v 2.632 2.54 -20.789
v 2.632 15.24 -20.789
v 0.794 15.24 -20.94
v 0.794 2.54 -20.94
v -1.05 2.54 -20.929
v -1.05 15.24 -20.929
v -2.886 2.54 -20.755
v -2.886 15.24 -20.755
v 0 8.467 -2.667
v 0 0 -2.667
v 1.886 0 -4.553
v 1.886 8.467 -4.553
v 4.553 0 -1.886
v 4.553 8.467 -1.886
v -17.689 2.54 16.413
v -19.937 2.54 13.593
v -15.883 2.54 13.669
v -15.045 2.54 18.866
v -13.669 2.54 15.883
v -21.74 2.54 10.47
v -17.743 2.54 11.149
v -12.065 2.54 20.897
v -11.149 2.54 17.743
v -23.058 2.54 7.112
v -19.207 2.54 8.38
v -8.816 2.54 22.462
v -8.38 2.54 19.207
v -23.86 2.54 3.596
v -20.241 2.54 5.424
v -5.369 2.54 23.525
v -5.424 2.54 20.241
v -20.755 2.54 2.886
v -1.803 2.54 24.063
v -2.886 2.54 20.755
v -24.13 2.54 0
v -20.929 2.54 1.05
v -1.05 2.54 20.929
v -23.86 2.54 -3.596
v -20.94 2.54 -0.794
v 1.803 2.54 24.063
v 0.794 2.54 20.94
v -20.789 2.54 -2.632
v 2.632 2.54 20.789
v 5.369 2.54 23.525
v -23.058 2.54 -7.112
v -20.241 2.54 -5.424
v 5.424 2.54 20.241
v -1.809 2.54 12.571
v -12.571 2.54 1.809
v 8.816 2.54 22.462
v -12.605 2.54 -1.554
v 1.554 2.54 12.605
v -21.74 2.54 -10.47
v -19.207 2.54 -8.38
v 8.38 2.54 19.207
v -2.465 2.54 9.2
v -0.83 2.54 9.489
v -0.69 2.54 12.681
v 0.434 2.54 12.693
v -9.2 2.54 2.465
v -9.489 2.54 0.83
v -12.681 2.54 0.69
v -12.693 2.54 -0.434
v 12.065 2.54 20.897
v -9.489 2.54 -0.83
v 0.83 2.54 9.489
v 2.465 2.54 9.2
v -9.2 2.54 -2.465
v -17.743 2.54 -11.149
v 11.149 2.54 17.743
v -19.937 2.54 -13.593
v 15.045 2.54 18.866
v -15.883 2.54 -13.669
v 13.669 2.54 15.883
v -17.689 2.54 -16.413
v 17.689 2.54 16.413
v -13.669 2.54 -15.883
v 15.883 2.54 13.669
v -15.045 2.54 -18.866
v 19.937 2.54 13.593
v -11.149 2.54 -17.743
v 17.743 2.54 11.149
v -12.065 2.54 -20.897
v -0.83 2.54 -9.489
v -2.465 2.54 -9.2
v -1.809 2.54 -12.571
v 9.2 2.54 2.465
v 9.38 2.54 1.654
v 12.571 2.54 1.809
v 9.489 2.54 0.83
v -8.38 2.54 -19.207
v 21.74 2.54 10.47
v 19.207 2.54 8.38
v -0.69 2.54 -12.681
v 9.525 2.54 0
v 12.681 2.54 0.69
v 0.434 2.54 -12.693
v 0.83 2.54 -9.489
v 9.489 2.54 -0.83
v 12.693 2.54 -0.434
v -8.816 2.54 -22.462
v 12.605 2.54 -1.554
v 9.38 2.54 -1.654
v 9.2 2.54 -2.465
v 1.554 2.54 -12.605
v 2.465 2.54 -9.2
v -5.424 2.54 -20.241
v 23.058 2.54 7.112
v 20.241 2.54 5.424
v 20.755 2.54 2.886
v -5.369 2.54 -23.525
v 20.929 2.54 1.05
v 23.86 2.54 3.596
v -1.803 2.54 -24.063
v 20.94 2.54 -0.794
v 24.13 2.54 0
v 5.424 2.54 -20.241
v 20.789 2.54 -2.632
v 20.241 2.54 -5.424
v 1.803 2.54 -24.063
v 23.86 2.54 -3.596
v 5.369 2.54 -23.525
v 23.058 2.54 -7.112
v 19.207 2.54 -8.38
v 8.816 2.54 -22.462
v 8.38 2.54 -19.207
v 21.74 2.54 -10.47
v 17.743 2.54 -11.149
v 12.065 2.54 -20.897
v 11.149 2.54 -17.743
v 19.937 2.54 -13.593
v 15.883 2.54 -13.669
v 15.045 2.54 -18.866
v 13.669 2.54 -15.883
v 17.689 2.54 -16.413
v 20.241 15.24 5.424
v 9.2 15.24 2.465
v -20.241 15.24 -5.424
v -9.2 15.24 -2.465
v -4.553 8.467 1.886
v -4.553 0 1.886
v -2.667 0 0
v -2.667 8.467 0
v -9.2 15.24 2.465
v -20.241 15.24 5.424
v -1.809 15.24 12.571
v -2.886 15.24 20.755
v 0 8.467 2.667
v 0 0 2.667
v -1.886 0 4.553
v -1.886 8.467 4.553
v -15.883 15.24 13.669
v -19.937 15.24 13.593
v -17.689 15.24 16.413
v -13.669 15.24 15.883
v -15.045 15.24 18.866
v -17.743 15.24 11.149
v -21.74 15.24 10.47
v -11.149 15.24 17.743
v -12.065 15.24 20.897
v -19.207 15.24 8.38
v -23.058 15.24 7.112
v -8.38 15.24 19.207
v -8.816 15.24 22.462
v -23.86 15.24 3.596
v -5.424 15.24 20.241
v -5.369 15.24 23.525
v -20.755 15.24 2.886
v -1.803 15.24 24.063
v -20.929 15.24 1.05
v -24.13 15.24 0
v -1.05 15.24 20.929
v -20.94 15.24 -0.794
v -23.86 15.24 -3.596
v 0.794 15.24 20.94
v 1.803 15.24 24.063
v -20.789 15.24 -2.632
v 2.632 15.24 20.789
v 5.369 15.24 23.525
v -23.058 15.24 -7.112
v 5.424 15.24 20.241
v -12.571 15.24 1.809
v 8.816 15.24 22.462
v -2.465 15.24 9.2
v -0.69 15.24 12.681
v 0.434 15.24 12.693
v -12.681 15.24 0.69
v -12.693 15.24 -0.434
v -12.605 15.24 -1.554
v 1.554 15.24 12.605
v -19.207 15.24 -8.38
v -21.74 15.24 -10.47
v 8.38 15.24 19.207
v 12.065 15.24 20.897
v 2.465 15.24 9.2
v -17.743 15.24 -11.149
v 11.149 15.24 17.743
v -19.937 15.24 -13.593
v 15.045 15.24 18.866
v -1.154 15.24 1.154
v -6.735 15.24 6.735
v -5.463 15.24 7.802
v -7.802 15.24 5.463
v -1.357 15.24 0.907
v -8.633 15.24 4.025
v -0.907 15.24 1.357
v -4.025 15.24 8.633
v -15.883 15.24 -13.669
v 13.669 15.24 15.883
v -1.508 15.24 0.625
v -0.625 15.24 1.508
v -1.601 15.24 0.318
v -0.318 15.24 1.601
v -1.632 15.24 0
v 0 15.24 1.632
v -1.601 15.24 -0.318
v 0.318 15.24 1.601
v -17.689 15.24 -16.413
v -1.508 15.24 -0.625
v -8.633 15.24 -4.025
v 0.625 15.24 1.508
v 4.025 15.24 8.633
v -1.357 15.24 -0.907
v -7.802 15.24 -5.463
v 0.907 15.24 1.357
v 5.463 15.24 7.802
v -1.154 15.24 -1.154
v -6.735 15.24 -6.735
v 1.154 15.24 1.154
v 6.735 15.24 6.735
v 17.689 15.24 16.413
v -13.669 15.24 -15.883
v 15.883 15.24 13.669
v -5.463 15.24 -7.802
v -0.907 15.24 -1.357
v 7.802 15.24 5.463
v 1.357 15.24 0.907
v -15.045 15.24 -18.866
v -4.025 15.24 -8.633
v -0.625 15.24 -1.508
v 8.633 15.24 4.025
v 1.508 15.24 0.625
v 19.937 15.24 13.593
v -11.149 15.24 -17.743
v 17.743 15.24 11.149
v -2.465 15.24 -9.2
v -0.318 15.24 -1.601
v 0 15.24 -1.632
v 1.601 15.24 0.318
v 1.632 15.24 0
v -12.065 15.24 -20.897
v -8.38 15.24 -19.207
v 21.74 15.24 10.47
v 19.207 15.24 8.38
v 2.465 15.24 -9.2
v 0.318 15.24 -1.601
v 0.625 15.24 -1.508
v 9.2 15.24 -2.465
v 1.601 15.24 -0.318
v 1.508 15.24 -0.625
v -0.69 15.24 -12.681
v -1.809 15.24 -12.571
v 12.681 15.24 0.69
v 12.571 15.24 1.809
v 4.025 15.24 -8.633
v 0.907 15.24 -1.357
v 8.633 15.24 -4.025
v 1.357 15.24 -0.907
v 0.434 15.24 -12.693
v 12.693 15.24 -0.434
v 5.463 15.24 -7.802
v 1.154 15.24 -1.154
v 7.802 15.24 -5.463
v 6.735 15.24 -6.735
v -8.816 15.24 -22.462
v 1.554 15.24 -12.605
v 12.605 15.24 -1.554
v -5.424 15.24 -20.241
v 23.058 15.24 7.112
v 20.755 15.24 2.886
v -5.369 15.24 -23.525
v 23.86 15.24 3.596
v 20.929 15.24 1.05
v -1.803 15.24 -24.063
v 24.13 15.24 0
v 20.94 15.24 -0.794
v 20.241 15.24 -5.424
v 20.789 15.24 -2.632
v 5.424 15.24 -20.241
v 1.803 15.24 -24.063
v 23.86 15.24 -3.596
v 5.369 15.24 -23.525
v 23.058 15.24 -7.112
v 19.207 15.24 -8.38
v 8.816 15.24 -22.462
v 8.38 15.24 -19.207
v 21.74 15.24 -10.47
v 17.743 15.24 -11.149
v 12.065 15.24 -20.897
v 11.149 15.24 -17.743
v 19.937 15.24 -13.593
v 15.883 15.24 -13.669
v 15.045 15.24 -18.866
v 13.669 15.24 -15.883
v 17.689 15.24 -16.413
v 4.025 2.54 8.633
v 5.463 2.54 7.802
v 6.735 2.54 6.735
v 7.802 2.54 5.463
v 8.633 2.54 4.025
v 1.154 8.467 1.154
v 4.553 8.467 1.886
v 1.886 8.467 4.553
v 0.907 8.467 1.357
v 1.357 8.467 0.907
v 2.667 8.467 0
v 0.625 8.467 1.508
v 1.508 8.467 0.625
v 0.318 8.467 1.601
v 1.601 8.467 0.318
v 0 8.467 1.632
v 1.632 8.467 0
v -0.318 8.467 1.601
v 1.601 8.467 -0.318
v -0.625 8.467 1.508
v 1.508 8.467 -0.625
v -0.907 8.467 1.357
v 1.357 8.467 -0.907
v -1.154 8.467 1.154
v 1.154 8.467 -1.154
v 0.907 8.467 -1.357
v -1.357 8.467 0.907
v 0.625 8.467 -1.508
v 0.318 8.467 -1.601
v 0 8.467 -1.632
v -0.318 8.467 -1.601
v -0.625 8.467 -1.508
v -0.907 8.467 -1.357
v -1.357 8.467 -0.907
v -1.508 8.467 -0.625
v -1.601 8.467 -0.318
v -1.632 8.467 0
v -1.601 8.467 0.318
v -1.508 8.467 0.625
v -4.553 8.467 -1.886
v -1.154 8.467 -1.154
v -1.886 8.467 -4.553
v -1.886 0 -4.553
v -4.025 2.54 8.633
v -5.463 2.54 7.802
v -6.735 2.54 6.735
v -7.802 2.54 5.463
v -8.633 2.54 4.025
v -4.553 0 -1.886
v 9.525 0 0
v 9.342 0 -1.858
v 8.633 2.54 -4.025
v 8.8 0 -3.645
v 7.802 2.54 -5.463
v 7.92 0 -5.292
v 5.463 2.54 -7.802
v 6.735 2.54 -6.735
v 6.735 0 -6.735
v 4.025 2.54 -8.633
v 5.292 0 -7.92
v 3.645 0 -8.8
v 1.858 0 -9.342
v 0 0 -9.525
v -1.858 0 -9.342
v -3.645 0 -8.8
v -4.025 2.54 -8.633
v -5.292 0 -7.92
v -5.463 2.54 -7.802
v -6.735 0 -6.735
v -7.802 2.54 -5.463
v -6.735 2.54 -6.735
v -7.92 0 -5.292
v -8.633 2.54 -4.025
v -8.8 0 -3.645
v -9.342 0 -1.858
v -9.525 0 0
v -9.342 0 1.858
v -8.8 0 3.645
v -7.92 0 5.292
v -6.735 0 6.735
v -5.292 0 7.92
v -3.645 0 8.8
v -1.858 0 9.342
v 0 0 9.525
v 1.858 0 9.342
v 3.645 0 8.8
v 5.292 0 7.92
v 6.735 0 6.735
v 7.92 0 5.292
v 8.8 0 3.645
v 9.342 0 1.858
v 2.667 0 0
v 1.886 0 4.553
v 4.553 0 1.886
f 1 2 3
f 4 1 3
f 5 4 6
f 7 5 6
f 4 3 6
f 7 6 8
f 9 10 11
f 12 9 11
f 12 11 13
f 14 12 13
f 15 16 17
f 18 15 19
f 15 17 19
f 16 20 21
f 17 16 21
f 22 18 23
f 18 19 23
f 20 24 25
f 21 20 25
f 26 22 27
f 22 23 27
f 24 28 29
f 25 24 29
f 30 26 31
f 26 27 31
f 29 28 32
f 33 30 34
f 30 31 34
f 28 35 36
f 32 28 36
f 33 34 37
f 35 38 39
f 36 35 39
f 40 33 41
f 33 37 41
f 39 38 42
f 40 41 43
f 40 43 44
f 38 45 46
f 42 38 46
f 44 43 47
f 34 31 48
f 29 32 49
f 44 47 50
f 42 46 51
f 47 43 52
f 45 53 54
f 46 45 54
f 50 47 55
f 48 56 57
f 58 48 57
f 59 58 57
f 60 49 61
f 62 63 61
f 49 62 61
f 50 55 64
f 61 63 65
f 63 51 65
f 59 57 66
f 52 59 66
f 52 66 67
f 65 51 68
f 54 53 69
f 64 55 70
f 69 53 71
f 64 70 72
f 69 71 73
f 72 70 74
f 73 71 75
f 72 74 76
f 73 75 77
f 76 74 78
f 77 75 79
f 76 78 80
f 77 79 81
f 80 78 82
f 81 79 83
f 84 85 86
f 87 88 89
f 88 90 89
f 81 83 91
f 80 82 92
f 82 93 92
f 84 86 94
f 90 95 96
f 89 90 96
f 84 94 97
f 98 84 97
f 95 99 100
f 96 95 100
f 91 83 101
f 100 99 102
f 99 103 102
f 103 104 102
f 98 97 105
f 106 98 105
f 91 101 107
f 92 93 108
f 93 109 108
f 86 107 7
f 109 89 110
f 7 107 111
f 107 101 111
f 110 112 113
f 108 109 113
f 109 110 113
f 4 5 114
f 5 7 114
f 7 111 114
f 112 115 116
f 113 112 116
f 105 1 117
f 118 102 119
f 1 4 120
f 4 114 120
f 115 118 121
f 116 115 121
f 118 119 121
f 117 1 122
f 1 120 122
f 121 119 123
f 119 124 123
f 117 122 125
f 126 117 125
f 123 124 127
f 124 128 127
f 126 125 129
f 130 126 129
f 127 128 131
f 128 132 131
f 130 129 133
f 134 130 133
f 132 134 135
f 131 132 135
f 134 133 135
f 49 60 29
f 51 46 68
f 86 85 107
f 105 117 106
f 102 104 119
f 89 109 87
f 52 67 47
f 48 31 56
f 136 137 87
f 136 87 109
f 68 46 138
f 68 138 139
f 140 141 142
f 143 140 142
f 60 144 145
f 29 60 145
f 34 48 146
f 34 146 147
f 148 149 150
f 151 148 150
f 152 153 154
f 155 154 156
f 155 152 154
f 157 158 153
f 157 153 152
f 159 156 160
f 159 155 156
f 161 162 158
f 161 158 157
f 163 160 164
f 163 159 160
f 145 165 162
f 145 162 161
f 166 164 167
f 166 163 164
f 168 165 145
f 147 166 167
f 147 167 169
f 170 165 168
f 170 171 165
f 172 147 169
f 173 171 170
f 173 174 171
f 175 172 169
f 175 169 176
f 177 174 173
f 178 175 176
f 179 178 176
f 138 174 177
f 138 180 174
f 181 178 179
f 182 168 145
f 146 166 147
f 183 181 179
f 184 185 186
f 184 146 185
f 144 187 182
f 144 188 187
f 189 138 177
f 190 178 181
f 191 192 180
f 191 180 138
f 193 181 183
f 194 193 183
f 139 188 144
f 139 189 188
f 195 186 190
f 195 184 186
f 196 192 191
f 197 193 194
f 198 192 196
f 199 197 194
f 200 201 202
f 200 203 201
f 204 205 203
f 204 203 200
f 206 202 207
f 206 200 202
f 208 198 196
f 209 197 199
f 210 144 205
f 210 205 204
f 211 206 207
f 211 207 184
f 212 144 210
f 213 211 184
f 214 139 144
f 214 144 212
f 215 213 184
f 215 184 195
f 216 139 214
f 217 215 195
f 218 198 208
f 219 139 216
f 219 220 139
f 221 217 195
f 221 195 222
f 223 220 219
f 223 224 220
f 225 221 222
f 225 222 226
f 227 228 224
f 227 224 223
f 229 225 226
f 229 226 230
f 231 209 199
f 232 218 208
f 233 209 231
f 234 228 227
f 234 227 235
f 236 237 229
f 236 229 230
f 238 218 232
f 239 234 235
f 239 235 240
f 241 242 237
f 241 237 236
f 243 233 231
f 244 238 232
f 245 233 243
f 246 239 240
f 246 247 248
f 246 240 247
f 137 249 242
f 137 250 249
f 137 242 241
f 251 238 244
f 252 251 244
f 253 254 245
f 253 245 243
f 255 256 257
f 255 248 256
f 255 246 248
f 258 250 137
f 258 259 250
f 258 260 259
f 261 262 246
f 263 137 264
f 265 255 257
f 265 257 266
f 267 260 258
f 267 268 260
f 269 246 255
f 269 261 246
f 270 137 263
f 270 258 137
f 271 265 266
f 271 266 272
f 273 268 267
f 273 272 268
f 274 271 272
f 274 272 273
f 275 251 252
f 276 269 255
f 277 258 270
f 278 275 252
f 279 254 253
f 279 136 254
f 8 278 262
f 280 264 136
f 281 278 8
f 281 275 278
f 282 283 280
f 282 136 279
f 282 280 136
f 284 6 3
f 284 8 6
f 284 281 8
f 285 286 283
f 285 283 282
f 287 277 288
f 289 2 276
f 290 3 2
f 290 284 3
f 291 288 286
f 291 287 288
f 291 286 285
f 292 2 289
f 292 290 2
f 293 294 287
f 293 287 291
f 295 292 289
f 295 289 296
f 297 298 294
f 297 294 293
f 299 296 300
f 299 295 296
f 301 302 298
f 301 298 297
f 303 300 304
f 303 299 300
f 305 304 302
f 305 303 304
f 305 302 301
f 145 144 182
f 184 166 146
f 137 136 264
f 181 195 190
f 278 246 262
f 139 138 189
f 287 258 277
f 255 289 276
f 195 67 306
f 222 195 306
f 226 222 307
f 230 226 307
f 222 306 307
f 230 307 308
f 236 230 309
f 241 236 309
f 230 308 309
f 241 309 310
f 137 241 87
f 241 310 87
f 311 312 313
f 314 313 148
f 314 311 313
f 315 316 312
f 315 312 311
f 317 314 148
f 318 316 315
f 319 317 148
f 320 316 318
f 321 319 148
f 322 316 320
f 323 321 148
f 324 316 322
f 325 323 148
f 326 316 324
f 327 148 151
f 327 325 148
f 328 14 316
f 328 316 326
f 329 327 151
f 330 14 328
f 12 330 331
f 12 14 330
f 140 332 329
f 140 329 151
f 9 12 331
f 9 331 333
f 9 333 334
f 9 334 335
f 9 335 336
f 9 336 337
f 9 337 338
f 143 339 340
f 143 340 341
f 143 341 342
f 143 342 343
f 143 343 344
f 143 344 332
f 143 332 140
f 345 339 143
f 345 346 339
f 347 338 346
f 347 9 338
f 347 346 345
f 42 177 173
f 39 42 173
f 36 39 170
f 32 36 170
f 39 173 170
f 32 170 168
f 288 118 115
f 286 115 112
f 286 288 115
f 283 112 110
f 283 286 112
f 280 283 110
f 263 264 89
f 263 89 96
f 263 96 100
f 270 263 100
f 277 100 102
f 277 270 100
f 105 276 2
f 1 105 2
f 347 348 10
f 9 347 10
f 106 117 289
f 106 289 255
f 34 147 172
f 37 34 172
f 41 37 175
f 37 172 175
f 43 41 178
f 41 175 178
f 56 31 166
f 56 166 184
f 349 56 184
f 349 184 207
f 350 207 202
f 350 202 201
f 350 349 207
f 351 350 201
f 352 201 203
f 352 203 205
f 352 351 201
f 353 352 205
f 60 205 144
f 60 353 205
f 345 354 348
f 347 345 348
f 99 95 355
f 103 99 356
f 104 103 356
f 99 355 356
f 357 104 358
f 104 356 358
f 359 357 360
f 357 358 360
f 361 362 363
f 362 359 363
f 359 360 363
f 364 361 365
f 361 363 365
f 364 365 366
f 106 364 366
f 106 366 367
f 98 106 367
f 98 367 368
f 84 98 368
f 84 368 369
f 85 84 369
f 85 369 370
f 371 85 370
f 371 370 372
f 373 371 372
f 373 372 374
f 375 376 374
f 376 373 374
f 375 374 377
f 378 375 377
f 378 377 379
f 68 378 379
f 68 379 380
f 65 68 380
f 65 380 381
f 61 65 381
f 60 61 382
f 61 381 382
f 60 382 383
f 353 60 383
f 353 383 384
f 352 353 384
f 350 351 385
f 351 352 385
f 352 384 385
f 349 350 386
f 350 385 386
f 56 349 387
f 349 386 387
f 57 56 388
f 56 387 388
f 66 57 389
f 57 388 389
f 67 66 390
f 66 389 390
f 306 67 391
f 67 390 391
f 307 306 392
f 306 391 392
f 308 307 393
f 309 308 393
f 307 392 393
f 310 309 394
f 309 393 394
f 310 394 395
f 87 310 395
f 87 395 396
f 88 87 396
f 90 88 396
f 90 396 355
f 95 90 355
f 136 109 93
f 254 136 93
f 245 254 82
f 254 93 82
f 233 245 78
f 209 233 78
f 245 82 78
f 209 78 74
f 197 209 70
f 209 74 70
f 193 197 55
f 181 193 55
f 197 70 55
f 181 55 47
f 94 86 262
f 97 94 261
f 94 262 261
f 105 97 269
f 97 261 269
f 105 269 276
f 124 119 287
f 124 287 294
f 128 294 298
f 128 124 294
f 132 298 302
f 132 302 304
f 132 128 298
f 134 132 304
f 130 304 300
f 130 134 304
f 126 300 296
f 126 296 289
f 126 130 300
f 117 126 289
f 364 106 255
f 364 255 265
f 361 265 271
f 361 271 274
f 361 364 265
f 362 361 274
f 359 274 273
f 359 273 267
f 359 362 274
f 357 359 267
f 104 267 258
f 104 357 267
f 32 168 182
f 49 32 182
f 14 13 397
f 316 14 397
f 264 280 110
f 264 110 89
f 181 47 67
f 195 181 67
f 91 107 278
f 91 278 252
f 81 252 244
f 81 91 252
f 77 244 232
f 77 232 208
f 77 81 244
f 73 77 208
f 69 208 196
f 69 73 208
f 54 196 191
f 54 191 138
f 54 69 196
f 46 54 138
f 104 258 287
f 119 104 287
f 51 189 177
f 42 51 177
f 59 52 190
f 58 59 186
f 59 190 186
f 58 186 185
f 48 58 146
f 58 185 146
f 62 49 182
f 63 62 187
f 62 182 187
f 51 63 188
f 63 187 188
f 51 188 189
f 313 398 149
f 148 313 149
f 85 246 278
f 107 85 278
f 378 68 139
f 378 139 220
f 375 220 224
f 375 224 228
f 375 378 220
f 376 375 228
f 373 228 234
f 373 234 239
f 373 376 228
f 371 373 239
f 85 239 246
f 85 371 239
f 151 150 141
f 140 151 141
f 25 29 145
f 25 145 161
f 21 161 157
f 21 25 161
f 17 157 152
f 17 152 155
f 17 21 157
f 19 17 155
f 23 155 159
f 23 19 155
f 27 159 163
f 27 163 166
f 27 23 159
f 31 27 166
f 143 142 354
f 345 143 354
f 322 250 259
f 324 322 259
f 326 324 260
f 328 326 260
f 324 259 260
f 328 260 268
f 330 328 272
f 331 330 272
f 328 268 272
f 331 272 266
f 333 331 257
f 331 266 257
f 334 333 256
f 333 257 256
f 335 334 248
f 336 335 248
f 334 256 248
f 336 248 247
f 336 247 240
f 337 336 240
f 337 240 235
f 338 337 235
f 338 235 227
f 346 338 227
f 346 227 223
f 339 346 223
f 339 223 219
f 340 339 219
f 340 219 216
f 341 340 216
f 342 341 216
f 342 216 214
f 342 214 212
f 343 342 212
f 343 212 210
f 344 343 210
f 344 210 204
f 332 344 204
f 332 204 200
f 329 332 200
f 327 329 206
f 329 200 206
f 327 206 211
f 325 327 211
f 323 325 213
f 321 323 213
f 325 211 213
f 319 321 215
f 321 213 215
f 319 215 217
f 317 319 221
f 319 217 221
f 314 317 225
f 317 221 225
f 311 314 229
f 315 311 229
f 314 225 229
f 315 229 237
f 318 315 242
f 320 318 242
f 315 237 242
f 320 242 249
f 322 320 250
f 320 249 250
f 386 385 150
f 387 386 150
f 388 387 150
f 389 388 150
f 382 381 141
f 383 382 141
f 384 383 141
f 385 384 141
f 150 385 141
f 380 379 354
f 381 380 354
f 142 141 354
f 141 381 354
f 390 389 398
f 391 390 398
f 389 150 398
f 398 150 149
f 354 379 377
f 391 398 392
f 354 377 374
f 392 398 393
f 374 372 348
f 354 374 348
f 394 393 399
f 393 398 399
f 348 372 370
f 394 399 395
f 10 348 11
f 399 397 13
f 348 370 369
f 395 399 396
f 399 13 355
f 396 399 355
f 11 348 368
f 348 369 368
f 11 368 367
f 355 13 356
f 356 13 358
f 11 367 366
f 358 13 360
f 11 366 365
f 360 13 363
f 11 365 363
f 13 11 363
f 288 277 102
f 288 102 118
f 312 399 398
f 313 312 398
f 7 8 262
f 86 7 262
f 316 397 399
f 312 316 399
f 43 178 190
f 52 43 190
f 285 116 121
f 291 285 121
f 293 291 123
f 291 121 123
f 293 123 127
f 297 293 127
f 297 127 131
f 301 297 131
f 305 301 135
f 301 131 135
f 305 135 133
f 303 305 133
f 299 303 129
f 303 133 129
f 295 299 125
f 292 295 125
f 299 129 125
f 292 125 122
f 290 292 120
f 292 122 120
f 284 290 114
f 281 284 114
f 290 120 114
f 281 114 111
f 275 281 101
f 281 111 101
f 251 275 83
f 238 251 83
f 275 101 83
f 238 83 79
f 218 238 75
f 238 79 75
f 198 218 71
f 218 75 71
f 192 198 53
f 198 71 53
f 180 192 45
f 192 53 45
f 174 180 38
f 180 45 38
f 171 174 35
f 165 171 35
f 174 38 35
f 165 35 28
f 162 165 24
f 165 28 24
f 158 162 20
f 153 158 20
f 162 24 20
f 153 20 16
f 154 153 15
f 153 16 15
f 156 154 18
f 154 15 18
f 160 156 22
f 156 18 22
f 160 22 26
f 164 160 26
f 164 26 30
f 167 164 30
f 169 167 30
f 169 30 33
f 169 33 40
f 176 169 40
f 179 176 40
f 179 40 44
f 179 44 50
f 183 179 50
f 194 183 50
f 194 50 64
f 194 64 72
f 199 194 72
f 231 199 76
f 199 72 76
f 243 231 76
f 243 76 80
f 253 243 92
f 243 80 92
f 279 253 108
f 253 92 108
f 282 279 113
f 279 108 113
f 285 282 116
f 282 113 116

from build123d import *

# Parameters (mm, degrees)
SKETCH1_R           = 9.525
BOSS_EXTRUDE1_DEPTH = 2.54
SKETCH3_R           = 24.13
BOSS_EXTRUDE2_DEPTH = 12.7
CUT_EXTRUDE2_DEPTH  = 16.24
CUT_EXTRUDE3_DEPTH  = 8.466666667
SKETCH5_R           = 1.63195
CUT_EXTRUDE4_DEPTH  = 16.24


with BuildPart() as part:
    # Sketch1 → Boss-Extrude1 (new body)
    with BuildSketch(Plane(origin=(0, 0, 0), x_dir=(1, 0, 0), z_dir=(0, 1, 0))):
        Circle(SKETCH1_R)
    extrude(amount=BOSS_EXTRUDE1_DEPTH)

    # Sketch3 → Boss-Extrude2 (add)
    with BuildSketch(Plane(origin=(0, 2.54, 0), x_dir=(1, 0, 0), z_dir=(0, 1, 0))):
        Circle(SKETCH3_R)
        with BuildLine():
            Line((-2.465251405, 9.200443495), (-5.42355309, 20.24097569))
            ThreePointArc((-5.42355309, 20.24097569), (-14.8174226, 14.8174226), (-20.24097569, 5.42355309))
            Line((-20.24097569, 5.42355309), (-9.200443495, 2.465251405))
            ThreePointArc((-9.200443495, 2.465251405), (-6.735192091, 6.735192091), (-2.465251405, 9.200443495))
        make_face(mode=Mode.SUBTRACT)
        with BuildLine():
            Line((9.200443495, 2.465251405), (20.24097569, 5.42355309))
            ThreePointArc((20.24097569, 5.42355309), (14.8174226, 14.8174226), (5.42355309, 20.24097569))
            Line((5.42355309, 20.24097569), (2.465251405, 9.200443495))
            ThreePointArc((2.465251405, 9.200443495), (6.735192091, 6.735192091), (9.200443495, 2.465251405))
        make_face(mode=Mode.SUBTRACT)
        with BuildLine():
            Line((9.200443495, -2.465251405), (20.24097569, -5.42355309))
            ThreePointArc((20.24097569, -5.42355309), (14.8174226, -14.8174226), (5.42355309, -20.24097569))
            Line((5.42355309, -20.24097569), (2.465251405, -9.200443495))
            ThreePointArc((2.465251405, -9.200443495), (6.735192091, -6.735192091), (9.200443495, -2.465251405))
        make_face(mode=Mode.SUBTRACT)
        with BuildLine():
            Line((-9.200443495, -2.465251405), (-20.24097569, -5.42355309))
            ThreePointArc((-20.24097569, -5.42355309), (-14.8174226, -14.8174226), (-5.42355309, -20.24097569))
            Line((-5.42355309, -20.24097569), (-2.465251405, -9.200443495))
            ThreePointArc((-2.465251405, -9.200443495), (-6.735192091, -6.735192091), (-9.200443495, -2.465251405))
        make_face(mode=Mode.SUBTRACT)
    extrude(amount=BOSS_EXTRUDE2_DEPTH)

    # Sketch4 → Cut-Extrude2 (cut, through all)
    with BuildSketch(Plane(origin=(0, 15.24, 0), x_dir=(1, 0, 0), z_dir=(0, 1, 0))):
        with BuildLine():
            Line((12.604555768, 1.554082971), (20.78910082, 2.631598769))
            ThreePointArc((20.78910082, 2.631598769), (20.95460619, -0.128469511), (20.755271414, -2.886301011))
            Line((20.755271414, -2.886301011), (12.570536445, -1.80876021))
            ThreePointArc((12.570536445, -1.80876021), (12.699350202, -0.128469656), (12.604555768, 1.554082971))
        make_face()
        with BuildLine():
            Line((-12.604555768, 1.554082971), (-20.78910082, 2.631598769))
            ThreePointArc((-20.78910082, 2.631598769), (-20.95460619, -0.128469511), (-20.755271414, -2.886301011))
            Line((-20.755271414, -2.886301011), (-12.570536445, -1.80876021))
            ThreePointArc((-12.570536445, -1.80876021), (-12.699350202, -0.128469656), (-12.604555768, 1.554082971))
        make_face()
        with BuildLine():
            Line((1.554082971, 12.604555768), (2.631598769, 20.78910082))
            ThreePointArc((2.631598769, 20.78910082), (-0.128469511, 20.95460619), (-2.886301011, 20.755271414))
            Line((-2.886301011, 20.755271414), (-1.80876021, 12.570536445))
            ThreePointArc((-1.80876021, 12.570536445), (-0.128469656, 12.699350202), (1.554082971, 12.604555768))
        make_face()
        with BuildLine():
            Line((-1.80876021, -12.570536445), (-2.886301011, -20.755271414))
            ThreePointArc((-2.886301011, -20.755271414), (-0.128469511, -20.95460619), (2.631598769, -20.78910082))
            Line((2.631598769, -20.78910082), (1.554082971, -12.604555768))
            ThreePointArc((1.554082971, -12.604555768), (-0.128469656, -12.699350202), (-1.80876021, -12.570536445))
        make_face()
    extrude(amount=-CUT_EXTRUDE2_DEPTH, mode=Mode.SUBTRACT)

    # Sketch2 → Cut-Extrude3 (cut)
    with BuildSketch(Plane(origin=(0, 0, 0), x_dir=(1, 0, 0), z_dir=(0, 1, 0))):
        Polygon((-4.552853785, 1.885853785), (-1.885853785, 4.552853785), (0, 2.667), (1.885853785, 4.552853785), (4.552853785, 1.885853785), (2.667, 0), (4.552853785, -1.885853785), (1.885853785, -4.552853785), (0, -2.667), (-1.885853785, -4.552853785), (-4.552853785, -1.885853785), (-2.667, 0), align=None)
    extrude(amount=CUT_EXTRUDE3_DEPTH, mode=Mode.SUBTRACT)

    # Sketch5 → Cut-Extrude4 (cut, through all)
    with BuildSketch(Plane(origin=(0, 15.24, 0), x_dir=(1, 0, 0), z_dir=(0, 1, 0))):
        Circle(SKETCH5_R)
    extrude(amount=-CUT_EXTRUDE4_DEPTH, mode=Mode.SUBTRACT)


solid = part.part
